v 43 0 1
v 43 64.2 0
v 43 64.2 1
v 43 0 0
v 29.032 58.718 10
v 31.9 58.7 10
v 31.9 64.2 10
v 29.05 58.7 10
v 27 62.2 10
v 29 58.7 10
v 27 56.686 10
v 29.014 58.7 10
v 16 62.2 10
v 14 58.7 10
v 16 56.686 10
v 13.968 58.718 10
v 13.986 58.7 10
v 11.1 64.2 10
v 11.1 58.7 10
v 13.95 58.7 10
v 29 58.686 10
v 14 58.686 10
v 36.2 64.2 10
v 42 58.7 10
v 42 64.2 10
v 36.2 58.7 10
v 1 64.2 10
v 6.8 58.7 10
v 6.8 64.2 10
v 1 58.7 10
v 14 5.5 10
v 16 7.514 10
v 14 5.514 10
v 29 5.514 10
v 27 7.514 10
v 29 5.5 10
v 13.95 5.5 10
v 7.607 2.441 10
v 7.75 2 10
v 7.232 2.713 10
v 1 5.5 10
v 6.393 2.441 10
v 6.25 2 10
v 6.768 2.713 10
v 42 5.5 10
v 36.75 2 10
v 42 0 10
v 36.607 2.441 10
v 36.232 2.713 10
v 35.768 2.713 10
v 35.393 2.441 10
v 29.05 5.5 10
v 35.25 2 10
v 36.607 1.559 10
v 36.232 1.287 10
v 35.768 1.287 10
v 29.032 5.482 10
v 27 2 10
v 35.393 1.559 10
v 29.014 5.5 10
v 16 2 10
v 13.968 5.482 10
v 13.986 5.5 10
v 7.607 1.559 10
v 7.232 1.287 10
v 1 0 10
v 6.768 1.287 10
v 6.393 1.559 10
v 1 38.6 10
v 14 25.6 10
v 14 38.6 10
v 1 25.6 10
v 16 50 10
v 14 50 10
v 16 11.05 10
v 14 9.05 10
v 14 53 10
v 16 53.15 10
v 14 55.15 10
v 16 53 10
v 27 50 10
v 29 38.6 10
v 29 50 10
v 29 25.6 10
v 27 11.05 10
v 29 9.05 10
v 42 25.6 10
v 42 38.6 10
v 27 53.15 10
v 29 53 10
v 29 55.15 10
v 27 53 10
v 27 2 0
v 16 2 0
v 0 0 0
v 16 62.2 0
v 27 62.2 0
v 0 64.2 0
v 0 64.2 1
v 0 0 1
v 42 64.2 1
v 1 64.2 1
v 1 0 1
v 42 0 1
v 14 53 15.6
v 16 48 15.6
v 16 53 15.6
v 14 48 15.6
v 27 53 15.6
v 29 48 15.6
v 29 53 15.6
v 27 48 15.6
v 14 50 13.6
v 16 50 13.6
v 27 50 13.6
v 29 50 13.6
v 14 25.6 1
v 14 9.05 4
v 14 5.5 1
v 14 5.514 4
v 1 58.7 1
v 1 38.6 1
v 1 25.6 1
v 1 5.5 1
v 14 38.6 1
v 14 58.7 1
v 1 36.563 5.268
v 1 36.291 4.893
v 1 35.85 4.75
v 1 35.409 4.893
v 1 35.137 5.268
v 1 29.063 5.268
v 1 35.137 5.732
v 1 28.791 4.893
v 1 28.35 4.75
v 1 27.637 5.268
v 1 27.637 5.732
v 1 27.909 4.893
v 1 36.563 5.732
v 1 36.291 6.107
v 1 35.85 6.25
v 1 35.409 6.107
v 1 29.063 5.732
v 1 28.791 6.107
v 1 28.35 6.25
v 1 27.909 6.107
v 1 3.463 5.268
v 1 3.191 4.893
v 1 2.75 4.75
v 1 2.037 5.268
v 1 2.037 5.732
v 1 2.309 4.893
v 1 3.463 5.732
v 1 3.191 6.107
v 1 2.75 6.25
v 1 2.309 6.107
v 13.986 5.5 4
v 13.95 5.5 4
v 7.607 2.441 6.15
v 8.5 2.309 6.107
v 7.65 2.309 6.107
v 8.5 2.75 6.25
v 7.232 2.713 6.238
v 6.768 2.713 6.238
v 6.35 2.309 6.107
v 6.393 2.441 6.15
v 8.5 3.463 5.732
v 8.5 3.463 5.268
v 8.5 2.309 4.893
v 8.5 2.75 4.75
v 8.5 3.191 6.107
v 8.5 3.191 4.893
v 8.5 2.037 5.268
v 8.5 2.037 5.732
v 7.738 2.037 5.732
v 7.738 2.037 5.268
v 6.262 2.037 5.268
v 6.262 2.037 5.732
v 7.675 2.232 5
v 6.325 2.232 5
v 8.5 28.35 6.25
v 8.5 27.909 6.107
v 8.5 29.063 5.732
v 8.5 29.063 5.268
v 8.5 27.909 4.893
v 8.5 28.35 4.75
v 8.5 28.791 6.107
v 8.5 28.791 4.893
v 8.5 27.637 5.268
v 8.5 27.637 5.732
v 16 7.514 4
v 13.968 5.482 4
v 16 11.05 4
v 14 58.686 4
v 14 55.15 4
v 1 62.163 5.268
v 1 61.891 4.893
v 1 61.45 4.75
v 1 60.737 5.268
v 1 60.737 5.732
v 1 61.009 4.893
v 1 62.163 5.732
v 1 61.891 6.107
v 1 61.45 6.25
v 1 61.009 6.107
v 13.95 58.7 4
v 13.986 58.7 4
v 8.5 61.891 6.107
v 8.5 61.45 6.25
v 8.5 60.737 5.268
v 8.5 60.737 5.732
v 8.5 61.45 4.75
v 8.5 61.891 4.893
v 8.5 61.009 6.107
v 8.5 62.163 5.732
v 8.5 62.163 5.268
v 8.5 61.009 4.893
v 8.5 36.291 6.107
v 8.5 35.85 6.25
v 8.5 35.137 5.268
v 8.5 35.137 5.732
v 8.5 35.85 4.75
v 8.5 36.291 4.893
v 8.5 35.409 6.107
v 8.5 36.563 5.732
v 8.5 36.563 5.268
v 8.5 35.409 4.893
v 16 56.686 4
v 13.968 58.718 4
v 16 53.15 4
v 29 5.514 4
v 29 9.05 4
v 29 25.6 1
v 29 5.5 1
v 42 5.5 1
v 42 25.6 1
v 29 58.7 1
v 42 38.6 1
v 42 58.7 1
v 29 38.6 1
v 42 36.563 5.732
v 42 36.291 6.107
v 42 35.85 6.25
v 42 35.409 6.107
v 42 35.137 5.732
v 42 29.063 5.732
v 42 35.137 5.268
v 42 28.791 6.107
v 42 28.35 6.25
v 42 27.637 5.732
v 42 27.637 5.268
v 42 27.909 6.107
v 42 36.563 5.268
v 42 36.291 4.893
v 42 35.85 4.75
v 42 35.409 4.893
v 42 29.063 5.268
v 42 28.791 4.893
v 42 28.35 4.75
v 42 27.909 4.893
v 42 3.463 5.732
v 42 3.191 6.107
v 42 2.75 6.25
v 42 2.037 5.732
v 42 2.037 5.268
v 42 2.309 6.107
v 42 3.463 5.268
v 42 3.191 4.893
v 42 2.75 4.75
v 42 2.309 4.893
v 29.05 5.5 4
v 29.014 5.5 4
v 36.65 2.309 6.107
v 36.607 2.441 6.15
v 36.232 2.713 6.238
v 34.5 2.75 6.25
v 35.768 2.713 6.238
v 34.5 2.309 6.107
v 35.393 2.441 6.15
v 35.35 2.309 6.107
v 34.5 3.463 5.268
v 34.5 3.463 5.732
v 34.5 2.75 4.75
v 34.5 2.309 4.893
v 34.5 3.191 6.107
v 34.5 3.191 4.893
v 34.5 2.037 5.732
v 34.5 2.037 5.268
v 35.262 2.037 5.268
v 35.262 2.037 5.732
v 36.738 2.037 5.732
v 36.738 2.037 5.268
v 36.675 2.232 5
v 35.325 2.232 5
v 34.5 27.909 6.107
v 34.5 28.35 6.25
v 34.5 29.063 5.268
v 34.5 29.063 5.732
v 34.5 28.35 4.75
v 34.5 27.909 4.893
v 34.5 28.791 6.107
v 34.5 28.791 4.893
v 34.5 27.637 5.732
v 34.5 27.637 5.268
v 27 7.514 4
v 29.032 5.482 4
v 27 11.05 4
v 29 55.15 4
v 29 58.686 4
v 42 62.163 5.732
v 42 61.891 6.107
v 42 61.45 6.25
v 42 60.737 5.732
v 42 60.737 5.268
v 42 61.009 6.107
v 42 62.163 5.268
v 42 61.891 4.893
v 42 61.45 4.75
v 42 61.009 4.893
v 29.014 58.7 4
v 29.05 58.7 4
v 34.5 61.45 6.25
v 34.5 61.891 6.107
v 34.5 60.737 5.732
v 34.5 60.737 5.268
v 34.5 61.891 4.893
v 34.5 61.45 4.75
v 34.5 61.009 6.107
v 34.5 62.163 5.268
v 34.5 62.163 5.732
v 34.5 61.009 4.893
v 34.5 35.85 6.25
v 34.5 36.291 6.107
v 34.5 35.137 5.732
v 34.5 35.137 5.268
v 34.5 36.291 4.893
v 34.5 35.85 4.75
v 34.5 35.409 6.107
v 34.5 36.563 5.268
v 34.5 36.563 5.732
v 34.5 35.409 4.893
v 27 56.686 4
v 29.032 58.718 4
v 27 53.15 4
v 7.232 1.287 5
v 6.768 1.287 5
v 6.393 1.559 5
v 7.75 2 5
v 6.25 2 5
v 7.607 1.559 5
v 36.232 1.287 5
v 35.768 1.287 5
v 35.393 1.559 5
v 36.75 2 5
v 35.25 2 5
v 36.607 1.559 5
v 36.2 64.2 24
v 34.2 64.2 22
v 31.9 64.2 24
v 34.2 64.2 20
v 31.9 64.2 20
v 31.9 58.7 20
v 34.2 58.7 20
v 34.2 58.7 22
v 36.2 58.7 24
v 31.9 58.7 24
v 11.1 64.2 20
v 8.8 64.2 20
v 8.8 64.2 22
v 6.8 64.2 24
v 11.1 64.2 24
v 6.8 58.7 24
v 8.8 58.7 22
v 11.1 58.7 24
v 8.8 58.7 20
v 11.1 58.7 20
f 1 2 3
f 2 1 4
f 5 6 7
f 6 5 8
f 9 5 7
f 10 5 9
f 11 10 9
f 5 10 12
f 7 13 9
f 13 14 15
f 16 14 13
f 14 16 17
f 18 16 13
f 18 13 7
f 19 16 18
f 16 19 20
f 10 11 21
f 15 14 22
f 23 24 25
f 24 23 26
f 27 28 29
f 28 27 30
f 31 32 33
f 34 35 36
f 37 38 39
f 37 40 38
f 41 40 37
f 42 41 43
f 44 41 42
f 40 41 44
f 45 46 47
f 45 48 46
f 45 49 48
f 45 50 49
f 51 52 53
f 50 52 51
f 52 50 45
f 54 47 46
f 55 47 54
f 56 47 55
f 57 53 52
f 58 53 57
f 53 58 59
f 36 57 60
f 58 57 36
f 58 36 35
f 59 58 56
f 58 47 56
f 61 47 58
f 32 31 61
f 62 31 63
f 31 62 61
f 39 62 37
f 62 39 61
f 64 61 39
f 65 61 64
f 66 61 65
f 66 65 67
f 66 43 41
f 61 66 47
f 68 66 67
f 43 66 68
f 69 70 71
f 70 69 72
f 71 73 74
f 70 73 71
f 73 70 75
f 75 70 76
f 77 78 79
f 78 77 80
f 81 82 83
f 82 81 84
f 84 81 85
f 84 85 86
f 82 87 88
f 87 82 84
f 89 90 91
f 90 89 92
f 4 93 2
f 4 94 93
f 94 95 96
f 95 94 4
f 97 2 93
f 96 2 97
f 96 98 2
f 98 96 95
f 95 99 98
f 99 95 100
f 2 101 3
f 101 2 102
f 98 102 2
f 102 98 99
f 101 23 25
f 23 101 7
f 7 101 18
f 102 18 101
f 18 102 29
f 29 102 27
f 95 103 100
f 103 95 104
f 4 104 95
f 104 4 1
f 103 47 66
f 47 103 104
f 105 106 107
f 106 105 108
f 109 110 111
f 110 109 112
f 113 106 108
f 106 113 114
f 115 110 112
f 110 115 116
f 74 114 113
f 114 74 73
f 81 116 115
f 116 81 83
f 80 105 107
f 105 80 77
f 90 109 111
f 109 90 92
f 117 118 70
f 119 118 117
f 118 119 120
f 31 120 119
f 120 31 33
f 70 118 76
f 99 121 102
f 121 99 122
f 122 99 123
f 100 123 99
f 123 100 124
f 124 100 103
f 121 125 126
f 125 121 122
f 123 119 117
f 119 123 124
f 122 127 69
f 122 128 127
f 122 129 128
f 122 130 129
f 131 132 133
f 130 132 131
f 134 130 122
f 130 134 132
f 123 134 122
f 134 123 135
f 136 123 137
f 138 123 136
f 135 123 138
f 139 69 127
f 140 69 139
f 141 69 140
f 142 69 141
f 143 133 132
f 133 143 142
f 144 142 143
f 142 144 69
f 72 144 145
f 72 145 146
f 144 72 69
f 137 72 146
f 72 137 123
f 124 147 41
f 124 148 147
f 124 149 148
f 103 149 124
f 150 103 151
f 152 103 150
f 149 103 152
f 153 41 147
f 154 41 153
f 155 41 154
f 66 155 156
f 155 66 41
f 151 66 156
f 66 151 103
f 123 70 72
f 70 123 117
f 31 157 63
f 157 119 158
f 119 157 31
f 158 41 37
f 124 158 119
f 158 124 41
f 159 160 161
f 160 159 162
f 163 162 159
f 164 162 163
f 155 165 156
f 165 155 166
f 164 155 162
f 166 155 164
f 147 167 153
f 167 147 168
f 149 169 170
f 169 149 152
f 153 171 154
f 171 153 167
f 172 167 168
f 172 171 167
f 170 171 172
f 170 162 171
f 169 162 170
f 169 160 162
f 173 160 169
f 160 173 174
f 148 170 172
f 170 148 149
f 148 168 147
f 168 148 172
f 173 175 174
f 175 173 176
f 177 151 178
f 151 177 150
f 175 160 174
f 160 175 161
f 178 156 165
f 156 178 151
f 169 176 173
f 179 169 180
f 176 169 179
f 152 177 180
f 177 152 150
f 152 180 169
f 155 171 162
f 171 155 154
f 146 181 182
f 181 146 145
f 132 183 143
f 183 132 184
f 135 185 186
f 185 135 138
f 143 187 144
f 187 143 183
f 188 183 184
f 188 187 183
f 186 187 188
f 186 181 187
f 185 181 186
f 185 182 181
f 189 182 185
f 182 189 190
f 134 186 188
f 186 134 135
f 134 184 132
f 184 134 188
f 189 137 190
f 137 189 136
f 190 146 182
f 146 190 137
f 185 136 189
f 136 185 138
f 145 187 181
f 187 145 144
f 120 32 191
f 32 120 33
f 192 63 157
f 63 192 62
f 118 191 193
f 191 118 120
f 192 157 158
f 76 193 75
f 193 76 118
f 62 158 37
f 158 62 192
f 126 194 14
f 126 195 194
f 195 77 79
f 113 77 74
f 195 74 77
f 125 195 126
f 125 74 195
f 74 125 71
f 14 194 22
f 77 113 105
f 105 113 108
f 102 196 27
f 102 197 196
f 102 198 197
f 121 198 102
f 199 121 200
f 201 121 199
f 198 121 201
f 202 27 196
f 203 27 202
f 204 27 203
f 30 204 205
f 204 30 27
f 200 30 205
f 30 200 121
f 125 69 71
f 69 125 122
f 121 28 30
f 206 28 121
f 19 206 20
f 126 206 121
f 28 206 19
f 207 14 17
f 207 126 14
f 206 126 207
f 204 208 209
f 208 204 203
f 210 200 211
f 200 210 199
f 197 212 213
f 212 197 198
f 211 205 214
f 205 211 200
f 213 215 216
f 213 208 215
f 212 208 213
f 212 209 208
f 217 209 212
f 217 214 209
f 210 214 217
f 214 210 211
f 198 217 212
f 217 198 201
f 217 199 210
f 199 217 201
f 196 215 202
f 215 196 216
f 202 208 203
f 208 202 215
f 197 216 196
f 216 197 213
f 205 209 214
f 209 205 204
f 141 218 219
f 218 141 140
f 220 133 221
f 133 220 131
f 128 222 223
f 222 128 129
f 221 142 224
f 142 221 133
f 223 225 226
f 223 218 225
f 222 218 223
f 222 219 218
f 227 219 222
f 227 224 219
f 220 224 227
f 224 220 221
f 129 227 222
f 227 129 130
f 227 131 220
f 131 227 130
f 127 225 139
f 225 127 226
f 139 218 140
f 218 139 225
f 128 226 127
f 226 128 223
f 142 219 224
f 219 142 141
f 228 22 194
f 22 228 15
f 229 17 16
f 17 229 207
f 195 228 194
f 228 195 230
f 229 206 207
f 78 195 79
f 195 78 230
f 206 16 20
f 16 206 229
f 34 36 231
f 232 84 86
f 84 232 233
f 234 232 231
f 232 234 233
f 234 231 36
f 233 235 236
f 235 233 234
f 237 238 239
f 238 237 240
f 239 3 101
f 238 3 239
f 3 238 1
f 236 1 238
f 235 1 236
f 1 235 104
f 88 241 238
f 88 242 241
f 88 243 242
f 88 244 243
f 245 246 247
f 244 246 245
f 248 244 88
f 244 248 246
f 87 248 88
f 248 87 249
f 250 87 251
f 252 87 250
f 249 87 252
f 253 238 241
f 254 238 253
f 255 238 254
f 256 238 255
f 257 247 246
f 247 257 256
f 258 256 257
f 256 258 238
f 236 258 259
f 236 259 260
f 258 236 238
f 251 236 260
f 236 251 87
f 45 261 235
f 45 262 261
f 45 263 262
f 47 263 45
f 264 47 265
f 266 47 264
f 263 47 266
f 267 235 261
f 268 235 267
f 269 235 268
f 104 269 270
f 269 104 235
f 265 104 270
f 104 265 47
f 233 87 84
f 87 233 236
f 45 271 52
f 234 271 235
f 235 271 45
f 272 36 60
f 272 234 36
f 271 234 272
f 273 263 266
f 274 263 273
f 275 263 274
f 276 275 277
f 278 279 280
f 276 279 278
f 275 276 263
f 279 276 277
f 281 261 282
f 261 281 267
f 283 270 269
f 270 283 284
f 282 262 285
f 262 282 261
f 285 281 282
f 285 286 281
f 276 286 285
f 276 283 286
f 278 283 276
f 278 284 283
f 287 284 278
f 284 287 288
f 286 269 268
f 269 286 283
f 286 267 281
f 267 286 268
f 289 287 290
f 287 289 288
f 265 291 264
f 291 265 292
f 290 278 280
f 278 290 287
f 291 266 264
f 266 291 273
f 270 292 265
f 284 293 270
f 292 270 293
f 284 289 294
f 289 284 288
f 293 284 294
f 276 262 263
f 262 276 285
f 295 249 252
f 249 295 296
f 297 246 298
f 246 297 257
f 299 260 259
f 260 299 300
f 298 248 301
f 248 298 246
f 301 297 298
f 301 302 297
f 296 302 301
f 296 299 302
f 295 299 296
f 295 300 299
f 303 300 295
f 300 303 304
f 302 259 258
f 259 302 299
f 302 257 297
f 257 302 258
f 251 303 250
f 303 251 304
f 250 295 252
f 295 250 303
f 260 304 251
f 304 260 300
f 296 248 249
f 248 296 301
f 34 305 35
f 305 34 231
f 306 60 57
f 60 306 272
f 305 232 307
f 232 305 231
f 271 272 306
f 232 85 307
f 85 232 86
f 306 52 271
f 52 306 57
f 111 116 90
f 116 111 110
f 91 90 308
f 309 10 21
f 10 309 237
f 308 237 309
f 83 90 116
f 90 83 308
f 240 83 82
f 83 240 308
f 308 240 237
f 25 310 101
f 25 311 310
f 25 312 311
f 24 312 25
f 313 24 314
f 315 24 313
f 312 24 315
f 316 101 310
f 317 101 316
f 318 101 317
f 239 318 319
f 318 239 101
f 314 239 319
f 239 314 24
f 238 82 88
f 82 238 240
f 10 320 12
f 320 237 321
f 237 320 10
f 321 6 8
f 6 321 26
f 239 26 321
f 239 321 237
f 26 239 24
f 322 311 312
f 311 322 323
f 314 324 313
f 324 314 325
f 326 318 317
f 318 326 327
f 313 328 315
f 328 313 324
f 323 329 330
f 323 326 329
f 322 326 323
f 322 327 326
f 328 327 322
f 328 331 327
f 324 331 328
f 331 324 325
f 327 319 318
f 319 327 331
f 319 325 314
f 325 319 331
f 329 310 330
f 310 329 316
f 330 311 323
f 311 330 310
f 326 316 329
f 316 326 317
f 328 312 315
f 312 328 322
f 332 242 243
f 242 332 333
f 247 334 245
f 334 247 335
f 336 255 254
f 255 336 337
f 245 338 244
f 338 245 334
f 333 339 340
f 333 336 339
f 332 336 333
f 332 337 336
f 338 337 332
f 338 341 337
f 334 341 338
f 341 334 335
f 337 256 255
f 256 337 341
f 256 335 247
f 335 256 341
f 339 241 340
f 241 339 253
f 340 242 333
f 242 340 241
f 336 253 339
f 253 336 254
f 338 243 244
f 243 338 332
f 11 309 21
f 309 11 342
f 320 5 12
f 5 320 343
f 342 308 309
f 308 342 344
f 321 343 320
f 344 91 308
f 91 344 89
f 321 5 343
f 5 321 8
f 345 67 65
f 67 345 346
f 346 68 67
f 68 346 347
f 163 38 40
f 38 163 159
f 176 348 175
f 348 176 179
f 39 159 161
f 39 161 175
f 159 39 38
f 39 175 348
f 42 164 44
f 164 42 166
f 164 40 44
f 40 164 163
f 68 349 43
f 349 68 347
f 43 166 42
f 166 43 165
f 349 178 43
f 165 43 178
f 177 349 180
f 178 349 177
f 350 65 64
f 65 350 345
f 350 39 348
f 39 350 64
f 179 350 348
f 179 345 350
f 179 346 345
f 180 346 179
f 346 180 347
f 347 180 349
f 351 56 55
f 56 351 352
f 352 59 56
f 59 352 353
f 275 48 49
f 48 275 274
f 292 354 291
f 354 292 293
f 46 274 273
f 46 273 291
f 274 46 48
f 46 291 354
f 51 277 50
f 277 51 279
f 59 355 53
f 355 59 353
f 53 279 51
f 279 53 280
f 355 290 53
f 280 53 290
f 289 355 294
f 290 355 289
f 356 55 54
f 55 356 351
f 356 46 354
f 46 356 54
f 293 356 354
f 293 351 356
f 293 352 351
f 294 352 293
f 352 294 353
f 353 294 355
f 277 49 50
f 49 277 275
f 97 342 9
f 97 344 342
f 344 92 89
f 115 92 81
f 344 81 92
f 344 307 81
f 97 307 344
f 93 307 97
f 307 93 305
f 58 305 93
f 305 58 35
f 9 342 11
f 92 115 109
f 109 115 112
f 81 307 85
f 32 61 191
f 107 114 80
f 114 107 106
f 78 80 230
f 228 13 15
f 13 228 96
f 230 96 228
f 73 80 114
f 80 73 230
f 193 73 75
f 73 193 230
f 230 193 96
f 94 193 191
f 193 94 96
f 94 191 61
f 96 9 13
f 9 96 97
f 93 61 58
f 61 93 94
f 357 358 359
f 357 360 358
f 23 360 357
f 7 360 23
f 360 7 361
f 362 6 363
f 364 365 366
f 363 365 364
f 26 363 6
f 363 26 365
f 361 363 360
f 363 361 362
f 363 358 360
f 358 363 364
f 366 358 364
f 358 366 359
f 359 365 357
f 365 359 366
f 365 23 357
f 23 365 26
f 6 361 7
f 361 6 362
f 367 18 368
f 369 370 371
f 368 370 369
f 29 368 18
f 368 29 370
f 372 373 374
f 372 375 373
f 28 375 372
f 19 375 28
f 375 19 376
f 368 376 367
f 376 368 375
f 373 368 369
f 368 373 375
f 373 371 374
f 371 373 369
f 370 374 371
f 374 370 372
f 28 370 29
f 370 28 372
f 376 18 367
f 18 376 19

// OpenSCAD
// frame for short four-legged robot (dimensions for pyboard hardware)
// History:
// v1: Fusion360, check 01_trivial dir
// v2: openscad:
//     - inverted servos support
//     - solid holder for IMU unit

// servo motor GH-S37A
SERVO_WIDTH = 13;
SERVO_LENGTH = 20.1;
SERVO_THICK = 9;
SERVO_EARS_LENGTH = 5.5;
SERVO_EARS_THICK = 1;
SERVO_HOLE_LENGTH = 7.5;
SERVO_HOLE_D = 1.5;
SERVO_WIRE_THICK = 2.5;
SERVO_WIRE_LENGTH = 10;

module servo(up_extrude = 1) {
    cube([SERVO_WIDTH, SERVO_LENGTH, SERVO_THICK*up_extrude]);
    translate([-SERVO_EARS_THICK, -SERVO_EARS_LENGTH, 0])
    cube([SERVO_EARS_THICK, (SERVO_EARS_LENGTH+0.6)*2 + SERVO_LENGTH, SERVO_THICK*up_extrude]);

    translate([-SERVO_EARS_THICK*2, -(SERVO_EARS_LENGTH)/2, SERVO_THICK/2])
    rotate([0, 90, 0])
    cylinder(SERVO_HOLE_LENGTH + SERVO_EARS_THICK*2, d=SERVO_HOLE_D, $fn=10);

    translate([-SERVO_EARS_THICK*2, SERVO_LENGTH + SERVO_EARS_LENGTH/2, SERVO_THICK/2])
    rotate([0, 90, 0])
    cylinder(SERVO_HOLE_LENGTH + SERVO_EARS_THICK*2, d=SERVO_HOLE_D, $fn=10);

    // cable
    translate([SERVO_WIDTH-SERVO_WIRE_THICK+0.7, SERVO_WIRE_THICK/2+.5, SERVO_THICK/3])
    rotate([0, 0, -45])
    cube([SERVO_WIRE_THICK, SERVO_WIRE_LENGTH, SERVO_THICK*2]);
}


BOARD_LENGTH = 50;
BOARD_WIDTH = 33;
BOARD_THICK = 1.6 + 2;
BOARD_HOLE_OFS = 2;

module board(up_extrude = 1) {
    cube([BOARD_WIDTH, BOARD_LENGTH, BOARD_THICK*up_extrude]);
}

// Frame base with servo and board placement
BASE_X_BOARD_SPACE = 5;
BASE_SERVO_DIST = 1;
BASE_LENGTH = (SERVO_LENGTH+2*SERVO_EARS_LENGTH+BASE_SERVO_DIST)*2;
BASE_WIDTH = BOARD_WIDTH + BASE_X_BOARD_SPACE*2;
BASE_THICK = 10;
BASE_UNDER_SERVO_DIM = 1;
BASE_BOARD_Z_OFS = BASE_THICK + 2;
BASE_INNER_THICK = 2;
BOARD_SCREW_DEPTH = 5;
BOARD_SCREW_D = 1.5;

HOLDER_LENGTH = 3;
HOLDER_EXTRA = 2;
HOLDER_THICK = BOARD_THICK + HOLDER_EXTRA;


//                translate([0, BOARD_LENGTH, BASE_THICK])
//                cube([BASE_WIDTH, BOARD_HOLDER_LENGTH, BOARD_HOLDER_THICK]);

module board_holder() {
    rotate([90, 0, 90])
    linear_extrude(BASE_WIDTH)
    polygon(points=[
        [0, 0], [HOLDER_LENGTH, 0], [HOLDER_LENGTH, HOLDER_THICK],
        [-HOLDER_EXTRA, HOLDER_THICK], [0, HOLDER_THICK - HOLDER_EXTRA]
    ]);
}


module frame_base() {
    difference() {
        union() {
            cube([BASE_WIDTH, BASE_LENGTH, BASE_THICK]);

            // board holder
            translate([0, BOARD_LENGTH, BASE_THICK])
            board_holder();
        }

        translate([SERVO_EARS_THICK, SERVO_EARS_LENGTH, BASE_UNDER_SERVO_DIM])
        servo(up_extrude=3);

        translate([SERVO_EARS_THICK, BASE_LENGTH-SERVO_EARS_LENGTH, BASE_UNDER_SERVO_DIM])
        mirror([0, 1, 0])
        servo(up_extrude=3);

        translate([BASE_WIDTH, 0, 0])
        mirror([1, 0, 0]) {
            translate([SERVO_EARS_THICK, SERVO_EARS_LENGTH, BASE_UNDER_SERVO_DIM])
            servo(up_extrude=3);
            mirror([0, 1, 0])
            translate([SERVO_EARS_THICK, -BASE_LENGTH+SERVO_EARS_LENGTH, BASE_UNDER_SERVO_DIM])
            servo(up_extrude=3);
        }

        translate([SERVO_WIDTH + SERVO_EARS_THICK + BASE_INNER_THICK, BASE_INNER_THICK, 0])
        cube([BASE_WIDTH - SERVO_WIDTH*2 - SERVO_EARS_THICK*2 - BASE_INNER_THICK*2,
              BASE_LENGTH - BASE_INNER_THICK*2, BASE_THICK + HOLDER_THICK]);

        // board screw holes
        translate([BASE_X_BOARD_SPACE, 0, BASE_THICK - BOARD_SCREW_DEPTH]) {
            translate([BOARD_HOLE_OFS, BOARD_HOLE_OFS, 0])
            cylinder(BOARD_SCREW_DEPTH, d=BOARD_SCREW_D, $fn=10);
            translate([BOARD_WIDTH-BOARD_HOLE_OFS, BOARD_HOLE_OFS, 0])
            cylinder(BOARD_SCREW_DEPTH, d=BOARD_SCREW_D, $fn=10);
        }
    }


}

module imu_holder(thickness) {
    // grip offsets
    linear_extrude(thickness)
    polygon([
        [4.3, 0],
        [4.3, 10],
        [2.0, 10], [2.0, 12],
        [4.3, 14], [0.0, 14],
        [0.0, 0],
    ]);
}

IMU_WIDTH = 25.4;
IMU_LENGTH = 25.6;
IMU_THICK = 1.7;

module imu_board() {
    x_ofs = (BASE_WIDTH - IMU_WIDTH)/2;
    y_ofs = (BASE_LENGTH - IMU_LENGTH)/2;

//    translate([x_ofs, y_ofs, 34])
    translate([2, 0, 0])
    cube([IMU_WIDTH, IMU_LENGTH, IMU_THICK]);
}


module imu_holders() {
    translate([IMU_WIDTH+4, 0, 0])
    mirror([1, 0, 0])
    rotate([90, 0, 0])
    imu_holder(SERVO_EARS_LENGTH);

    rotate([90, 0, 0])
    imu_holder(SERVO_EARS_LENGTH);
}

//imu_board();

//servo();
frame_base();

translate([(BASE_WIDTH - IMU_WIDTH-4)/2, BASE_LENGTH, BASE_THICK])
imu_holders();

//translate([BASE_X_BOARD_SPACE, 0, BASE_THICK])
//board();

//board_holder();
